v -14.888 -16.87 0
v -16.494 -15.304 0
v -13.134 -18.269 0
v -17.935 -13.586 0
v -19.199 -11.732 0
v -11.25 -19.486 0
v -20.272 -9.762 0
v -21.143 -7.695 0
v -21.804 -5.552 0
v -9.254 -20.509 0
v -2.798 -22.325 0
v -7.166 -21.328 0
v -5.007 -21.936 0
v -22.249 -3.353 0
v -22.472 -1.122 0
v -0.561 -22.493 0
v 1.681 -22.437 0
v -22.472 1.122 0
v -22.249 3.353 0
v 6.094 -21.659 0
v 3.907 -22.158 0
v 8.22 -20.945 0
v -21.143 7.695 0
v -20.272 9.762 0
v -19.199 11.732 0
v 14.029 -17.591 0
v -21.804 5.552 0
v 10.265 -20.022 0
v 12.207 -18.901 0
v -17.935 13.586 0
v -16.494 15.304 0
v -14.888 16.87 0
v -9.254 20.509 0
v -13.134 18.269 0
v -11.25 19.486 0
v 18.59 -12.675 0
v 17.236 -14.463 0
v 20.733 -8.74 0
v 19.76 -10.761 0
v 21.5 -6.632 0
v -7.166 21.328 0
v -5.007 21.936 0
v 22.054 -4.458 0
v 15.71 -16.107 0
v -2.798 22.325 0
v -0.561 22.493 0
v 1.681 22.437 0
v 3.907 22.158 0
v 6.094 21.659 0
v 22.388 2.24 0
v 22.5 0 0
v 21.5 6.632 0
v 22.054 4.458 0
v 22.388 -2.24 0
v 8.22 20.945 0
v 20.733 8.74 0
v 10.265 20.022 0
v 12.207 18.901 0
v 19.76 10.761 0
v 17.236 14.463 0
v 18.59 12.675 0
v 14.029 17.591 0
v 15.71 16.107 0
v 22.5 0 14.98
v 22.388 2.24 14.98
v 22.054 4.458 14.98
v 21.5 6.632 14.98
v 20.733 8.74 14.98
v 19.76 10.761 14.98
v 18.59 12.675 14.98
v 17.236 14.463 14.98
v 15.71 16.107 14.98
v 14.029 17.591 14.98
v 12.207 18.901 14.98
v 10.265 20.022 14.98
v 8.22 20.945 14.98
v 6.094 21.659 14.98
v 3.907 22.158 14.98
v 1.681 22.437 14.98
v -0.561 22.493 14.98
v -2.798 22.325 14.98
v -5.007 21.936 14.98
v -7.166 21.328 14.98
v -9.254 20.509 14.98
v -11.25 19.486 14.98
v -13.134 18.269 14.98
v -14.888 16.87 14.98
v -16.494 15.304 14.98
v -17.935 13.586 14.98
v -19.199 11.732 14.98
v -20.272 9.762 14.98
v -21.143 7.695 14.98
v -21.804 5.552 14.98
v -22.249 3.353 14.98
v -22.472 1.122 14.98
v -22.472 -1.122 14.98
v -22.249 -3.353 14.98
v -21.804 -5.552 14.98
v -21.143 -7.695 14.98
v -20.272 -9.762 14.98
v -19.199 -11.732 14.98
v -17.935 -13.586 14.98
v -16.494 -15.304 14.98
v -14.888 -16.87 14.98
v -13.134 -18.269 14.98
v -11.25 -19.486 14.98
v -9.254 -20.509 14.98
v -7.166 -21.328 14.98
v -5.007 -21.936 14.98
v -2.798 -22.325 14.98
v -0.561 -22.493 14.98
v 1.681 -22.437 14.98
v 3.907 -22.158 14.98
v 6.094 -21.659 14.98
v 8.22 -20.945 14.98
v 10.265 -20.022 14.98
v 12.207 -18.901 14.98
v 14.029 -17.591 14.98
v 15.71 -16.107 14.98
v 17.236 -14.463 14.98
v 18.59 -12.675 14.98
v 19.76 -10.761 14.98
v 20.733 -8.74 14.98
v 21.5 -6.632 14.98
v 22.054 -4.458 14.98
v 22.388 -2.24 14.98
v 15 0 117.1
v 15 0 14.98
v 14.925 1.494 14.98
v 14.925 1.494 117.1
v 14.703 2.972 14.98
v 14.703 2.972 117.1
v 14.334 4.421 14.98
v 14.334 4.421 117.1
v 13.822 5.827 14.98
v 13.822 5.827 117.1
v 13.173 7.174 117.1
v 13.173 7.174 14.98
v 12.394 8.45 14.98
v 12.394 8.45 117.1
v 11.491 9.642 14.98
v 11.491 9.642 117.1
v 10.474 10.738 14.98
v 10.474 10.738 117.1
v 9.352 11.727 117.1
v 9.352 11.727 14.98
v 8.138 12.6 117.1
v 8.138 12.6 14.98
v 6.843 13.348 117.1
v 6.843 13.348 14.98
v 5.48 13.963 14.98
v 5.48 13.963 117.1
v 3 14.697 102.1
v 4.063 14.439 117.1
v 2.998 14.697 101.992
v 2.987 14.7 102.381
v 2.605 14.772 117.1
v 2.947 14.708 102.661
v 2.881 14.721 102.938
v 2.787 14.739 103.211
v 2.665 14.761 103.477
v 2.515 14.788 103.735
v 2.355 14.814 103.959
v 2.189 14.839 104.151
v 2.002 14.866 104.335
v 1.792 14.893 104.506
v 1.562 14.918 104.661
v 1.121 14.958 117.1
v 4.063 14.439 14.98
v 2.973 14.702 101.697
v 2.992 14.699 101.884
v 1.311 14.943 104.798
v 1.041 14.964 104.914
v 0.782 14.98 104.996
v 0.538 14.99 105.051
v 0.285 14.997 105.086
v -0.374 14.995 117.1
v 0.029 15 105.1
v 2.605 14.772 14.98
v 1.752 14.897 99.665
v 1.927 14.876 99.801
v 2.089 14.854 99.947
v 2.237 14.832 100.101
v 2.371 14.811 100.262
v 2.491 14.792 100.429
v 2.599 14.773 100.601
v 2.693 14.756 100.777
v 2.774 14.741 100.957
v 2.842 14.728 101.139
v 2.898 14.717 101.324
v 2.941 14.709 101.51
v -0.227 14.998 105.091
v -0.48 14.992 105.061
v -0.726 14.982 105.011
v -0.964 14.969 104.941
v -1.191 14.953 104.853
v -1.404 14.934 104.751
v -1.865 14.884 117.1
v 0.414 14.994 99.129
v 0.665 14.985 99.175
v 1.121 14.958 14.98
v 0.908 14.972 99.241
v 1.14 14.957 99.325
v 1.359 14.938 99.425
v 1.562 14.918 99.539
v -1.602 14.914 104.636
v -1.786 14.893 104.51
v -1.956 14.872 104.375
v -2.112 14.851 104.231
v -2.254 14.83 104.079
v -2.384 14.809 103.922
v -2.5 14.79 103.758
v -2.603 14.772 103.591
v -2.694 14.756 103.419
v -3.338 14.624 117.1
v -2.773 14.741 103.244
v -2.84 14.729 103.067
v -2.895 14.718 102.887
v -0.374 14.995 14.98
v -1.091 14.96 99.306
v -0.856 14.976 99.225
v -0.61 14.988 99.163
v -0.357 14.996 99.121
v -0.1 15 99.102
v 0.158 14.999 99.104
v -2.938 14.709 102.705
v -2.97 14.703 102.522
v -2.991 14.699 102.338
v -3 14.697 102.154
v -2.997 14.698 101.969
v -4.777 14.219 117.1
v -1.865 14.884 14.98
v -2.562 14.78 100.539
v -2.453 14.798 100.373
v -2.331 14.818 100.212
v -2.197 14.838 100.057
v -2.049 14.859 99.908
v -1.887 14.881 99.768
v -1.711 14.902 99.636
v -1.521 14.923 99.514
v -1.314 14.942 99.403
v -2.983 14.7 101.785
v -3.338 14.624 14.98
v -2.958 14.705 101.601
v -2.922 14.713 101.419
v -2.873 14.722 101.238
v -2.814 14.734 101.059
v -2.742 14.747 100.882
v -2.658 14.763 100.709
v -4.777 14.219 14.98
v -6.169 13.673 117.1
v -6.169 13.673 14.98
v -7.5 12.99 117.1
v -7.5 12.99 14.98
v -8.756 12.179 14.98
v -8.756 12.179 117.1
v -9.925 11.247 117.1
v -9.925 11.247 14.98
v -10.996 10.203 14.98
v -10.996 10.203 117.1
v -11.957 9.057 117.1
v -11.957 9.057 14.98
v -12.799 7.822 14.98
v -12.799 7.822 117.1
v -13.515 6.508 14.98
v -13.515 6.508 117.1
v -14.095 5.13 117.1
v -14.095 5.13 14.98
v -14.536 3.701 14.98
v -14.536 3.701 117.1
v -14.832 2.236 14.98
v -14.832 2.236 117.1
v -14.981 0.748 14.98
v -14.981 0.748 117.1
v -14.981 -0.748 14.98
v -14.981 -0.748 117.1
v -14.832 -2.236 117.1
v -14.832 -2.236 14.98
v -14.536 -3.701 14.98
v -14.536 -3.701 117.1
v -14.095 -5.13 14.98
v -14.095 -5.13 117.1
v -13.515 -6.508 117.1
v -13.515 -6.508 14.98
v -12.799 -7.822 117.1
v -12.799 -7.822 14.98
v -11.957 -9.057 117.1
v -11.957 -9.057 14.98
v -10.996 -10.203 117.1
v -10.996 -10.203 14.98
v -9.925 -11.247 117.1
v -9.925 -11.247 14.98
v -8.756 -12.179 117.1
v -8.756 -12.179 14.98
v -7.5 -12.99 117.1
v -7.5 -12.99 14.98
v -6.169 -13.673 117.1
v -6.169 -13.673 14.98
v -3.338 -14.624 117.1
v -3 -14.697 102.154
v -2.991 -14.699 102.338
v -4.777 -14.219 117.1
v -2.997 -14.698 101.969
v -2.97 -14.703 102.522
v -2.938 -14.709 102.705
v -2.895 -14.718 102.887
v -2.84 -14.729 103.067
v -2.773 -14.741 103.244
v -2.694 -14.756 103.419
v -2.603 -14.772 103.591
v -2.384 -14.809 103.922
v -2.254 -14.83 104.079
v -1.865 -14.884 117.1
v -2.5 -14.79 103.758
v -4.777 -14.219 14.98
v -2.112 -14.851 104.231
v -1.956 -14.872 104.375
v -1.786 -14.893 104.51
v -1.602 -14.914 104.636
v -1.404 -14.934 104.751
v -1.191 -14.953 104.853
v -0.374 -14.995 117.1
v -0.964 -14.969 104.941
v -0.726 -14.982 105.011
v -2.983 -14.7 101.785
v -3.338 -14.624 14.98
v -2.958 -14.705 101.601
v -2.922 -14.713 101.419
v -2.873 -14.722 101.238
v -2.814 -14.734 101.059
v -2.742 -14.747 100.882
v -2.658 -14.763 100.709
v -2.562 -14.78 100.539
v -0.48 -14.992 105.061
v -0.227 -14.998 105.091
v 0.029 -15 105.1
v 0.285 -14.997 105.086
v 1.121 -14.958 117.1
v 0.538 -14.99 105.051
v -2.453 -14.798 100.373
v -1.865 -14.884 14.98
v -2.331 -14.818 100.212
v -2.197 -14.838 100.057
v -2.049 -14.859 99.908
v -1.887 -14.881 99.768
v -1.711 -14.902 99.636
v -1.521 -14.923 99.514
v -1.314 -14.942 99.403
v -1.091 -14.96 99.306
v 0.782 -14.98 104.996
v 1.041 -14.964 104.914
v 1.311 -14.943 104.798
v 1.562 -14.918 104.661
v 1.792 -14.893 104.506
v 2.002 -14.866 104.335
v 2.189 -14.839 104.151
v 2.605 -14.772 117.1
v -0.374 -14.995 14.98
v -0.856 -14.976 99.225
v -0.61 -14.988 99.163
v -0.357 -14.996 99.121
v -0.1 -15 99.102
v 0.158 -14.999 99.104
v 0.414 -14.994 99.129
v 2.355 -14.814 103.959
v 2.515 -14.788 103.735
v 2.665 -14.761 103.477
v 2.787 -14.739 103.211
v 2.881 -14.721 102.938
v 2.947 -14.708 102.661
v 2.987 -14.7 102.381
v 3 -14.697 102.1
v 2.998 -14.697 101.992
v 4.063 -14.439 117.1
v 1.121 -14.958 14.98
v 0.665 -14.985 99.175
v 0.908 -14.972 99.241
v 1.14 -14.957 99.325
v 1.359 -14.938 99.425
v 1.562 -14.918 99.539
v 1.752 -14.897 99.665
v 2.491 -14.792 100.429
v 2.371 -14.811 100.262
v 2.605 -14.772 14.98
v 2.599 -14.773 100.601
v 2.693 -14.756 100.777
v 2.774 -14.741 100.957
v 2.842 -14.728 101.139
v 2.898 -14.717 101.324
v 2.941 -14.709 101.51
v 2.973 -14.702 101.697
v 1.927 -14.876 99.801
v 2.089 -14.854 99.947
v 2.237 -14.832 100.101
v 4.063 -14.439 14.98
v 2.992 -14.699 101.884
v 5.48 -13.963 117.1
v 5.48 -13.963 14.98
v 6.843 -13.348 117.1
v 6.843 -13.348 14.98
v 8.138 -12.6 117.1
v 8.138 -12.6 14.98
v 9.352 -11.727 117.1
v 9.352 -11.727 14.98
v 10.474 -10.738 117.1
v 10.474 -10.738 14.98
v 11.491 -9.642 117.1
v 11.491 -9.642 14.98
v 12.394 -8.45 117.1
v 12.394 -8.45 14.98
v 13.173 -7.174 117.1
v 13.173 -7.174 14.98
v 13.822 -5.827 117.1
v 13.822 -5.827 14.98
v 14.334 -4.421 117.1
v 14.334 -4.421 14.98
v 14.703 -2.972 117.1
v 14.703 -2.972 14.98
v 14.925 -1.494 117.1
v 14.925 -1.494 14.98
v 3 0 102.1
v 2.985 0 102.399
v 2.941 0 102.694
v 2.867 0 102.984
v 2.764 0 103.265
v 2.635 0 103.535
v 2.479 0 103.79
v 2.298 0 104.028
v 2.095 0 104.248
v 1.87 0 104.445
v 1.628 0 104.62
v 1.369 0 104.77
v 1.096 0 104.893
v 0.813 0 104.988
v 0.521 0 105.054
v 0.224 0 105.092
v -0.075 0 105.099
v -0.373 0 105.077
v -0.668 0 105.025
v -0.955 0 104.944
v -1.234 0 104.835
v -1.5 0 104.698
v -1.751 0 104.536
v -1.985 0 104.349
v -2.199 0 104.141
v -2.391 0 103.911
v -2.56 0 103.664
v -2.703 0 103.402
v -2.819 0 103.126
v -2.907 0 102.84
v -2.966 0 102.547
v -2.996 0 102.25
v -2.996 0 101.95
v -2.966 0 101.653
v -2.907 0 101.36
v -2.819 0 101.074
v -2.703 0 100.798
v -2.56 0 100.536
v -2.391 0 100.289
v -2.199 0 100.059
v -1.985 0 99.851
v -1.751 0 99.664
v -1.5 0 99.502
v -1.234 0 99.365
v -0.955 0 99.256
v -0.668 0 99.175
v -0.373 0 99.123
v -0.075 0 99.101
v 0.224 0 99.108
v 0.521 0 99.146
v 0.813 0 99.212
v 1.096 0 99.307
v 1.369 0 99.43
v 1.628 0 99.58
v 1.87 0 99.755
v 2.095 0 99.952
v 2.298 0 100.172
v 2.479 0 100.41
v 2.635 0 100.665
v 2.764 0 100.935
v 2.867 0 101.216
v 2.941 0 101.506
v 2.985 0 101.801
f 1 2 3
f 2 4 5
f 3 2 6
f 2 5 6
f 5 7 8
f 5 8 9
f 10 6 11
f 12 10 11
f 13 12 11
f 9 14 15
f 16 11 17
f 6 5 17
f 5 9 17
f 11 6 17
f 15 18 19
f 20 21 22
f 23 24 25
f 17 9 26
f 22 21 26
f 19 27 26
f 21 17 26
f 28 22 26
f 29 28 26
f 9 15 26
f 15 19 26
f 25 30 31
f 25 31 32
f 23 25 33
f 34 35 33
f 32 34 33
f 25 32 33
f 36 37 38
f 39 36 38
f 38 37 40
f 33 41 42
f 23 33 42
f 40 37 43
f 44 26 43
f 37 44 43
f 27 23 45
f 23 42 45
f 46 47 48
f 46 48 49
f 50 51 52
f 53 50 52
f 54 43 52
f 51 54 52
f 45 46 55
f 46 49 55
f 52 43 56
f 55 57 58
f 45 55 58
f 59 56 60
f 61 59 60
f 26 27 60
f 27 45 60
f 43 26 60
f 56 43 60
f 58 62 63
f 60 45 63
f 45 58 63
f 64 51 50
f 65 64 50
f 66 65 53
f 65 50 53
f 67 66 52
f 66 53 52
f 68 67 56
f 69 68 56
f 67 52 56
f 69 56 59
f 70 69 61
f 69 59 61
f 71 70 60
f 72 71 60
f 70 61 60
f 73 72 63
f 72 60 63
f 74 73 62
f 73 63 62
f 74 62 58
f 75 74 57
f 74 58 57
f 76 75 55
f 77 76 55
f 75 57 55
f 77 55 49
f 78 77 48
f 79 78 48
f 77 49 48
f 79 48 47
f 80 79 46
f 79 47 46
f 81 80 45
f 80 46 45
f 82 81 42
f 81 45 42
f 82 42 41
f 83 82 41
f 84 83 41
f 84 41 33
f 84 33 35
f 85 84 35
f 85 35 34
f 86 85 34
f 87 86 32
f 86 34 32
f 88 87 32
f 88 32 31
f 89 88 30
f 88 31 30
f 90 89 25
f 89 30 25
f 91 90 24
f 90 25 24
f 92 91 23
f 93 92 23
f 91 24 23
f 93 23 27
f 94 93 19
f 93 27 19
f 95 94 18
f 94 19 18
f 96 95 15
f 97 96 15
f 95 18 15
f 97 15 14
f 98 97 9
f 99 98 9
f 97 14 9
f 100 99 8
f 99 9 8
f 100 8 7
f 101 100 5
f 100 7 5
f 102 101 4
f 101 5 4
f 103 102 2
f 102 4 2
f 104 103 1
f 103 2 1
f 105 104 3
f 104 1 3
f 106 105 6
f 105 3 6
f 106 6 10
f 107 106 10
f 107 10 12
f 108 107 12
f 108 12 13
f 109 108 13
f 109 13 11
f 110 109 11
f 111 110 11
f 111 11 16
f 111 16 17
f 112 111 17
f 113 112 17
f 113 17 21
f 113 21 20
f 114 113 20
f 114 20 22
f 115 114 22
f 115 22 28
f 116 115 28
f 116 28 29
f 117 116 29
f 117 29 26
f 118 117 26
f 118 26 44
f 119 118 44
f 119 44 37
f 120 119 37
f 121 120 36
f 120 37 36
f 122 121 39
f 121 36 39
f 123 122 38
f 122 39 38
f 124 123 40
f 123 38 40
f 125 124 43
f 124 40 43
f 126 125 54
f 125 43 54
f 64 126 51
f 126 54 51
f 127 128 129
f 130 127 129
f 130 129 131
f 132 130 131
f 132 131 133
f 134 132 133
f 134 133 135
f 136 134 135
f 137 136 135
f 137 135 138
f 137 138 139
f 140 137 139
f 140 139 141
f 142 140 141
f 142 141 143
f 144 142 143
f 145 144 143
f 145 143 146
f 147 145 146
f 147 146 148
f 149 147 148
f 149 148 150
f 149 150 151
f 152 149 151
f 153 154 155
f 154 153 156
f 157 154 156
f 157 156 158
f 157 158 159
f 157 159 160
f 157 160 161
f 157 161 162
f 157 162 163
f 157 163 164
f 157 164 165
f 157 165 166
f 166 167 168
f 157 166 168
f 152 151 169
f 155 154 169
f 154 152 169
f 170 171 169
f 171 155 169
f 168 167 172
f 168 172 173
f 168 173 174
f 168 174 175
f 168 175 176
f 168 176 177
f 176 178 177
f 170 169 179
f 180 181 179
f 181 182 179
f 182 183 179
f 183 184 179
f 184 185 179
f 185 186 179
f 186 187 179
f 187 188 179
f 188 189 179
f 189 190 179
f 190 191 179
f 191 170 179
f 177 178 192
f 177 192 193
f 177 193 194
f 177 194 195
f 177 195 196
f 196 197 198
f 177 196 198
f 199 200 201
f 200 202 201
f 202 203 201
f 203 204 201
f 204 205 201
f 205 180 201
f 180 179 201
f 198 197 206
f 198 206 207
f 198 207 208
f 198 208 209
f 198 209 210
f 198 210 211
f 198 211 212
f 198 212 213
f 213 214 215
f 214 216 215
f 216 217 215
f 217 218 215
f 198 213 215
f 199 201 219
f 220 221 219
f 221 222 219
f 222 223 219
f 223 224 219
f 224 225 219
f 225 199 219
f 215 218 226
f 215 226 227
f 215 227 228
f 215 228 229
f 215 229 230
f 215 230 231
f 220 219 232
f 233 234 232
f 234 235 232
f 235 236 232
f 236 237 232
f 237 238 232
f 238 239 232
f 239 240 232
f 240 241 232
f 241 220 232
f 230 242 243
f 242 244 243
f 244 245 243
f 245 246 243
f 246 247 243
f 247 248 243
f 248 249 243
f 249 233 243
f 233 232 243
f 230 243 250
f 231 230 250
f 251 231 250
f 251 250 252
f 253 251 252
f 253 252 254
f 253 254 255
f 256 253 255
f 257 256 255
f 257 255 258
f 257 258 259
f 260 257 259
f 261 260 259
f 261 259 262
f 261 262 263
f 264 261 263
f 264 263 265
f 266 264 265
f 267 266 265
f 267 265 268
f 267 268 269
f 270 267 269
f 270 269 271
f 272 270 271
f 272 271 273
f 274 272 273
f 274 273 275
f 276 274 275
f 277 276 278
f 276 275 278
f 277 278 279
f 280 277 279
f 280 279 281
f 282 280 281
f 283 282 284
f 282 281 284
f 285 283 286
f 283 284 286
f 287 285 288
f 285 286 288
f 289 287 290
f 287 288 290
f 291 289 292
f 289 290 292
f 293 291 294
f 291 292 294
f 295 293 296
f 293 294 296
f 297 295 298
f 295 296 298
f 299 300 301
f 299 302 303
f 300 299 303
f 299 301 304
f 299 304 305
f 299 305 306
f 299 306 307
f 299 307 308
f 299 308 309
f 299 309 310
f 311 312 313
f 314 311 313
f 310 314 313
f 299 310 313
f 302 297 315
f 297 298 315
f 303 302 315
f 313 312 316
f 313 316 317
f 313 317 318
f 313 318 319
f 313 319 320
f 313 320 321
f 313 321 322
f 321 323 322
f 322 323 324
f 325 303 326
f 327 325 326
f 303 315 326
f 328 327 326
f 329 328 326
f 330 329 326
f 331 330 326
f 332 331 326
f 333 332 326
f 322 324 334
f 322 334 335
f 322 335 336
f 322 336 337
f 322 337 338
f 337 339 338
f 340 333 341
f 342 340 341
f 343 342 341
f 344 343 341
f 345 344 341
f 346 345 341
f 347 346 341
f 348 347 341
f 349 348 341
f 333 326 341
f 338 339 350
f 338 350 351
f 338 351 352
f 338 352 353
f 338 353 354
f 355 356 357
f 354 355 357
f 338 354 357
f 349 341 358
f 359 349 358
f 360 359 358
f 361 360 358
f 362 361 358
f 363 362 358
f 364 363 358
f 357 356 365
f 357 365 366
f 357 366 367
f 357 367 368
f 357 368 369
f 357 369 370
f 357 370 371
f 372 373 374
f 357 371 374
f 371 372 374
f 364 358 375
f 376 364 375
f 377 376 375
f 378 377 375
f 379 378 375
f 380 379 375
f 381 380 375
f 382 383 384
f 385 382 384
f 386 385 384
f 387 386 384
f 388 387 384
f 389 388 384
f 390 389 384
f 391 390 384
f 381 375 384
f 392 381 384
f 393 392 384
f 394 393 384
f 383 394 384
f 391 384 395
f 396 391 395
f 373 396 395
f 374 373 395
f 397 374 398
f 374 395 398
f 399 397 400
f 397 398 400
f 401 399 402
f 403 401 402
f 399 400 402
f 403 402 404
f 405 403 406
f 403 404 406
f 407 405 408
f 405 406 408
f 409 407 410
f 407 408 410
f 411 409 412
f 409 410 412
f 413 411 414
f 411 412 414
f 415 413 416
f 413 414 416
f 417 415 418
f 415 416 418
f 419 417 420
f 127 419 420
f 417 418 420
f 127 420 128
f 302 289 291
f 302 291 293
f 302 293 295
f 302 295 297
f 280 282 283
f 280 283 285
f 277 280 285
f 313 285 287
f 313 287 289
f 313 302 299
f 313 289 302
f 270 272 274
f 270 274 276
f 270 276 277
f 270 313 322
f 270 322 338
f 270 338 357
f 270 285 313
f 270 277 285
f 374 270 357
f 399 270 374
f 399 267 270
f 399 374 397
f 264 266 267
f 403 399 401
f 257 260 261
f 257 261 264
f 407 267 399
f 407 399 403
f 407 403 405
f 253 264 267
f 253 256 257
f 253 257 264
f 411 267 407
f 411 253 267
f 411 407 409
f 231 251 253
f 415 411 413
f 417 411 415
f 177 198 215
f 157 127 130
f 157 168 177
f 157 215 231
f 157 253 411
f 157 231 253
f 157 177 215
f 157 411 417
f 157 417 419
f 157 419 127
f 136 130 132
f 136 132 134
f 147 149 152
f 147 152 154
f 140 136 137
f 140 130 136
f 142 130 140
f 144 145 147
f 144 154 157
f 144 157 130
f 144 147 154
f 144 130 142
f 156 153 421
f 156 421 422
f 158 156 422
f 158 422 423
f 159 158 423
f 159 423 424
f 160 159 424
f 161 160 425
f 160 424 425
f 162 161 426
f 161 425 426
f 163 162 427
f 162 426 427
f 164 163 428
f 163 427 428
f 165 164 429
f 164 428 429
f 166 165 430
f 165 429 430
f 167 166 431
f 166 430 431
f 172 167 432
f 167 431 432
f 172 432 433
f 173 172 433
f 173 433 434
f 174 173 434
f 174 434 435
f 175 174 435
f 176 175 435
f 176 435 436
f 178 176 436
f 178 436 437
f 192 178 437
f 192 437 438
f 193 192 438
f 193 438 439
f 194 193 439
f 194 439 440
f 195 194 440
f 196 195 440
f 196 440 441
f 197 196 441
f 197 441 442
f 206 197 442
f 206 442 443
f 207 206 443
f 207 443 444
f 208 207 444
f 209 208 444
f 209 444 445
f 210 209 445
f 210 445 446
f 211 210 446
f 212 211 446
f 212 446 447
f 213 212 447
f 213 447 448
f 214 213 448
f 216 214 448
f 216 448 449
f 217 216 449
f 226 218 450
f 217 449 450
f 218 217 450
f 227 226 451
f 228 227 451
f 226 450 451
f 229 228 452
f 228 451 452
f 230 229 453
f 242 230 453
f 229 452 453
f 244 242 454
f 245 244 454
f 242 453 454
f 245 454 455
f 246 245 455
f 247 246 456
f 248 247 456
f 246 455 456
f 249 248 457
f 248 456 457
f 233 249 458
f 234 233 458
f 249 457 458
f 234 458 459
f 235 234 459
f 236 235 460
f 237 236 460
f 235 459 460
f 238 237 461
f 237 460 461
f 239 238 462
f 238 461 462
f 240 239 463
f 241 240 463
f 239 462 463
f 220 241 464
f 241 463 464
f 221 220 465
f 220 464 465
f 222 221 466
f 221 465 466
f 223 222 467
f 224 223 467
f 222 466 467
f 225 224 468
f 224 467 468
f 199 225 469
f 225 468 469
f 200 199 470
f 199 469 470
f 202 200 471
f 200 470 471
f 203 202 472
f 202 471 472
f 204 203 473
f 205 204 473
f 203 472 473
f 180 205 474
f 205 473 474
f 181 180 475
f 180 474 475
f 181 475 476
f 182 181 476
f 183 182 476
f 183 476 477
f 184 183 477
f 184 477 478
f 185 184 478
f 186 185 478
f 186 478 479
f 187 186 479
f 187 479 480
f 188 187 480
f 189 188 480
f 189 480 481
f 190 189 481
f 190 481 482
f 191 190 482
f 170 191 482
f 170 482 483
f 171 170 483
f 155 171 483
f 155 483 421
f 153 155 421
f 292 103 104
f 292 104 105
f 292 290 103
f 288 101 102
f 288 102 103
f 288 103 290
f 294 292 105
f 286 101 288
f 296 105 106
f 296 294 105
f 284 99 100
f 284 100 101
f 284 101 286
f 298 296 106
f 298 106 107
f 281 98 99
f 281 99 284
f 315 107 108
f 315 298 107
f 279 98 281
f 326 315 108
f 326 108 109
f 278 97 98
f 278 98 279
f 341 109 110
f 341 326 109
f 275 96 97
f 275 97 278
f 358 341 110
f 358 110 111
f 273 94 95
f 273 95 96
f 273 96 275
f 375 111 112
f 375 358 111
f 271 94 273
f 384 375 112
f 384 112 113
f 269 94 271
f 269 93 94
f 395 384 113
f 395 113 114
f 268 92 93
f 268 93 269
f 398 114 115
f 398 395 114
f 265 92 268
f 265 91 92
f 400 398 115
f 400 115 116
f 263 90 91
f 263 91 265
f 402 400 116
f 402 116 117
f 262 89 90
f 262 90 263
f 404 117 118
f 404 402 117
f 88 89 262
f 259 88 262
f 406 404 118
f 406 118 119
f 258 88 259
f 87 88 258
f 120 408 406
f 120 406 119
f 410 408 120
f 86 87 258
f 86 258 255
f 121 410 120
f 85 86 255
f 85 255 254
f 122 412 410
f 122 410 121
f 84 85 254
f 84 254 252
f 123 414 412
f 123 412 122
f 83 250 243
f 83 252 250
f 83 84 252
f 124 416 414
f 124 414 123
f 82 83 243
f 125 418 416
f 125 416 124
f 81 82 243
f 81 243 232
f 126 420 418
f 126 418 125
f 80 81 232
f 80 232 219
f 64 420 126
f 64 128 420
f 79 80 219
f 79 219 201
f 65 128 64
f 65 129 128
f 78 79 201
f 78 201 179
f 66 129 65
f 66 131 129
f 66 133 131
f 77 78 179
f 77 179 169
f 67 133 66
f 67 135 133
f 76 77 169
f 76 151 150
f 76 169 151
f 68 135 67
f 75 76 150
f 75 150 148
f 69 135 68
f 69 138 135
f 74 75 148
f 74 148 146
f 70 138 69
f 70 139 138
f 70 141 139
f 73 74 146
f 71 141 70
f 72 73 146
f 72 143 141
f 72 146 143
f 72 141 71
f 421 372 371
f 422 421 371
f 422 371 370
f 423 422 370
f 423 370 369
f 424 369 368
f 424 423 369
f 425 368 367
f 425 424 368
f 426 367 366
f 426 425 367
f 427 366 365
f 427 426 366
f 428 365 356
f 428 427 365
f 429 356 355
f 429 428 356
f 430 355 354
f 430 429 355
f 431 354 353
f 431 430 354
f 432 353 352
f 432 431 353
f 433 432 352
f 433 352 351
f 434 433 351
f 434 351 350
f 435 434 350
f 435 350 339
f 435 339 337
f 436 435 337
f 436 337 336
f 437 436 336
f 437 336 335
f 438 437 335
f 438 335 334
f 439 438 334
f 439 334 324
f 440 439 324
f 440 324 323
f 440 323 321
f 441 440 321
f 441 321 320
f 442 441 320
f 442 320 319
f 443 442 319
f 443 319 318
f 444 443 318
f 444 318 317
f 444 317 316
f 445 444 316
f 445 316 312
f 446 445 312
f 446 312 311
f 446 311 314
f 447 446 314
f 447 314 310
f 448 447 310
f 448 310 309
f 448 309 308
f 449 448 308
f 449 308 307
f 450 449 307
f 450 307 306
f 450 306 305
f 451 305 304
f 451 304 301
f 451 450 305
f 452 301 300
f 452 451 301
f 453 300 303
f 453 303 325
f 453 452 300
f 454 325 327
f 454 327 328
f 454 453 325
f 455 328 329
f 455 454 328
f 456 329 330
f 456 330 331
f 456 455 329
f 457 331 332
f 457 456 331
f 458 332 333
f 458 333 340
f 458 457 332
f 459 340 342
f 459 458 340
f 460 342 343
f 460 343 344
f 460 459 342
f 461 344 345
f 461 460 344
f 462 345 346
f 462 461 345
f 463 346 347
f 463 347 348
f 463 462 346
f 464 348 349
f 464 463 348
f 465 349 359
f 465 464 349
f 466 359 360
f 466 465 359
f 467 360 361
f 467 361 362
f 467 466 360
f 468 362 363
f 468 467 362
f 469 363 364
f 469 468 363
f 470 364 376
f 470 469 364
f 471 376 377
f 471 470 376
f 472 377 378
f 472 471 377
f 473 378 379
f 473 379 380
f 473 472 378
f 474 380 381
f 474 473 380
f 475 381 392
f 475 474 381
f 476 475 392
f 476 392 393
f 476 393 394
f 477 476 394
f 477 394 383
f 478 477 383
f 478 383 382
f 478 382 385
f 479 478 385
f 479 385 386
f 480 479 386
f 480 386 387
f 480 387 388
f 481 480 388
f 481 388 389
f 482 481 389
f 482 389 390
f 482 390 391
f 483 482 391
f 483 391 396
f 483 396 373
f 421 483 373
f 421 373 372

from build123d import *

# Parameters (mm, degrees)
SKETCH_R          = 22.5
PAD_DEPTH         = 14.98
SKETCH001_R       = 15
PAD001_DEPTH      = 102.12
SKETCH003_R       = 3
POCKET_DEPTH      = 22.501
POCKET_DEPTH_BACK = -22.501


with BuildPart() as part:
    # Sketch → Pad (new body)
    with BuildSketch(Plane.XY):
        Circle(SKETCH_R)
    extrude(amount=PAD_DEPTH)

    # Sketch001 (on Face3 of Pad) → Pad001 (join)
    with BuildSketch(Plane.XY.offset(14.98)):
        Circle(SKETCH001_R)
    extrude(amount=PAD001_DEPTH)

    # Sketch003 → Pocket (cut, two sides)
    with BuildSketch(Plane.XZ) as pocket_sk:
        with Locations((0, 102.1)):
            Circle(SKETCH003_R)
    extrude(amount=-POCKET_DEPTH, mode=Mode.SUBTRACT)
    extrude(pocket_sk.sketch, amount=-POCKET_DEPTH_BACK, mode=Mode.SUBTRACT)


solid = part.part
